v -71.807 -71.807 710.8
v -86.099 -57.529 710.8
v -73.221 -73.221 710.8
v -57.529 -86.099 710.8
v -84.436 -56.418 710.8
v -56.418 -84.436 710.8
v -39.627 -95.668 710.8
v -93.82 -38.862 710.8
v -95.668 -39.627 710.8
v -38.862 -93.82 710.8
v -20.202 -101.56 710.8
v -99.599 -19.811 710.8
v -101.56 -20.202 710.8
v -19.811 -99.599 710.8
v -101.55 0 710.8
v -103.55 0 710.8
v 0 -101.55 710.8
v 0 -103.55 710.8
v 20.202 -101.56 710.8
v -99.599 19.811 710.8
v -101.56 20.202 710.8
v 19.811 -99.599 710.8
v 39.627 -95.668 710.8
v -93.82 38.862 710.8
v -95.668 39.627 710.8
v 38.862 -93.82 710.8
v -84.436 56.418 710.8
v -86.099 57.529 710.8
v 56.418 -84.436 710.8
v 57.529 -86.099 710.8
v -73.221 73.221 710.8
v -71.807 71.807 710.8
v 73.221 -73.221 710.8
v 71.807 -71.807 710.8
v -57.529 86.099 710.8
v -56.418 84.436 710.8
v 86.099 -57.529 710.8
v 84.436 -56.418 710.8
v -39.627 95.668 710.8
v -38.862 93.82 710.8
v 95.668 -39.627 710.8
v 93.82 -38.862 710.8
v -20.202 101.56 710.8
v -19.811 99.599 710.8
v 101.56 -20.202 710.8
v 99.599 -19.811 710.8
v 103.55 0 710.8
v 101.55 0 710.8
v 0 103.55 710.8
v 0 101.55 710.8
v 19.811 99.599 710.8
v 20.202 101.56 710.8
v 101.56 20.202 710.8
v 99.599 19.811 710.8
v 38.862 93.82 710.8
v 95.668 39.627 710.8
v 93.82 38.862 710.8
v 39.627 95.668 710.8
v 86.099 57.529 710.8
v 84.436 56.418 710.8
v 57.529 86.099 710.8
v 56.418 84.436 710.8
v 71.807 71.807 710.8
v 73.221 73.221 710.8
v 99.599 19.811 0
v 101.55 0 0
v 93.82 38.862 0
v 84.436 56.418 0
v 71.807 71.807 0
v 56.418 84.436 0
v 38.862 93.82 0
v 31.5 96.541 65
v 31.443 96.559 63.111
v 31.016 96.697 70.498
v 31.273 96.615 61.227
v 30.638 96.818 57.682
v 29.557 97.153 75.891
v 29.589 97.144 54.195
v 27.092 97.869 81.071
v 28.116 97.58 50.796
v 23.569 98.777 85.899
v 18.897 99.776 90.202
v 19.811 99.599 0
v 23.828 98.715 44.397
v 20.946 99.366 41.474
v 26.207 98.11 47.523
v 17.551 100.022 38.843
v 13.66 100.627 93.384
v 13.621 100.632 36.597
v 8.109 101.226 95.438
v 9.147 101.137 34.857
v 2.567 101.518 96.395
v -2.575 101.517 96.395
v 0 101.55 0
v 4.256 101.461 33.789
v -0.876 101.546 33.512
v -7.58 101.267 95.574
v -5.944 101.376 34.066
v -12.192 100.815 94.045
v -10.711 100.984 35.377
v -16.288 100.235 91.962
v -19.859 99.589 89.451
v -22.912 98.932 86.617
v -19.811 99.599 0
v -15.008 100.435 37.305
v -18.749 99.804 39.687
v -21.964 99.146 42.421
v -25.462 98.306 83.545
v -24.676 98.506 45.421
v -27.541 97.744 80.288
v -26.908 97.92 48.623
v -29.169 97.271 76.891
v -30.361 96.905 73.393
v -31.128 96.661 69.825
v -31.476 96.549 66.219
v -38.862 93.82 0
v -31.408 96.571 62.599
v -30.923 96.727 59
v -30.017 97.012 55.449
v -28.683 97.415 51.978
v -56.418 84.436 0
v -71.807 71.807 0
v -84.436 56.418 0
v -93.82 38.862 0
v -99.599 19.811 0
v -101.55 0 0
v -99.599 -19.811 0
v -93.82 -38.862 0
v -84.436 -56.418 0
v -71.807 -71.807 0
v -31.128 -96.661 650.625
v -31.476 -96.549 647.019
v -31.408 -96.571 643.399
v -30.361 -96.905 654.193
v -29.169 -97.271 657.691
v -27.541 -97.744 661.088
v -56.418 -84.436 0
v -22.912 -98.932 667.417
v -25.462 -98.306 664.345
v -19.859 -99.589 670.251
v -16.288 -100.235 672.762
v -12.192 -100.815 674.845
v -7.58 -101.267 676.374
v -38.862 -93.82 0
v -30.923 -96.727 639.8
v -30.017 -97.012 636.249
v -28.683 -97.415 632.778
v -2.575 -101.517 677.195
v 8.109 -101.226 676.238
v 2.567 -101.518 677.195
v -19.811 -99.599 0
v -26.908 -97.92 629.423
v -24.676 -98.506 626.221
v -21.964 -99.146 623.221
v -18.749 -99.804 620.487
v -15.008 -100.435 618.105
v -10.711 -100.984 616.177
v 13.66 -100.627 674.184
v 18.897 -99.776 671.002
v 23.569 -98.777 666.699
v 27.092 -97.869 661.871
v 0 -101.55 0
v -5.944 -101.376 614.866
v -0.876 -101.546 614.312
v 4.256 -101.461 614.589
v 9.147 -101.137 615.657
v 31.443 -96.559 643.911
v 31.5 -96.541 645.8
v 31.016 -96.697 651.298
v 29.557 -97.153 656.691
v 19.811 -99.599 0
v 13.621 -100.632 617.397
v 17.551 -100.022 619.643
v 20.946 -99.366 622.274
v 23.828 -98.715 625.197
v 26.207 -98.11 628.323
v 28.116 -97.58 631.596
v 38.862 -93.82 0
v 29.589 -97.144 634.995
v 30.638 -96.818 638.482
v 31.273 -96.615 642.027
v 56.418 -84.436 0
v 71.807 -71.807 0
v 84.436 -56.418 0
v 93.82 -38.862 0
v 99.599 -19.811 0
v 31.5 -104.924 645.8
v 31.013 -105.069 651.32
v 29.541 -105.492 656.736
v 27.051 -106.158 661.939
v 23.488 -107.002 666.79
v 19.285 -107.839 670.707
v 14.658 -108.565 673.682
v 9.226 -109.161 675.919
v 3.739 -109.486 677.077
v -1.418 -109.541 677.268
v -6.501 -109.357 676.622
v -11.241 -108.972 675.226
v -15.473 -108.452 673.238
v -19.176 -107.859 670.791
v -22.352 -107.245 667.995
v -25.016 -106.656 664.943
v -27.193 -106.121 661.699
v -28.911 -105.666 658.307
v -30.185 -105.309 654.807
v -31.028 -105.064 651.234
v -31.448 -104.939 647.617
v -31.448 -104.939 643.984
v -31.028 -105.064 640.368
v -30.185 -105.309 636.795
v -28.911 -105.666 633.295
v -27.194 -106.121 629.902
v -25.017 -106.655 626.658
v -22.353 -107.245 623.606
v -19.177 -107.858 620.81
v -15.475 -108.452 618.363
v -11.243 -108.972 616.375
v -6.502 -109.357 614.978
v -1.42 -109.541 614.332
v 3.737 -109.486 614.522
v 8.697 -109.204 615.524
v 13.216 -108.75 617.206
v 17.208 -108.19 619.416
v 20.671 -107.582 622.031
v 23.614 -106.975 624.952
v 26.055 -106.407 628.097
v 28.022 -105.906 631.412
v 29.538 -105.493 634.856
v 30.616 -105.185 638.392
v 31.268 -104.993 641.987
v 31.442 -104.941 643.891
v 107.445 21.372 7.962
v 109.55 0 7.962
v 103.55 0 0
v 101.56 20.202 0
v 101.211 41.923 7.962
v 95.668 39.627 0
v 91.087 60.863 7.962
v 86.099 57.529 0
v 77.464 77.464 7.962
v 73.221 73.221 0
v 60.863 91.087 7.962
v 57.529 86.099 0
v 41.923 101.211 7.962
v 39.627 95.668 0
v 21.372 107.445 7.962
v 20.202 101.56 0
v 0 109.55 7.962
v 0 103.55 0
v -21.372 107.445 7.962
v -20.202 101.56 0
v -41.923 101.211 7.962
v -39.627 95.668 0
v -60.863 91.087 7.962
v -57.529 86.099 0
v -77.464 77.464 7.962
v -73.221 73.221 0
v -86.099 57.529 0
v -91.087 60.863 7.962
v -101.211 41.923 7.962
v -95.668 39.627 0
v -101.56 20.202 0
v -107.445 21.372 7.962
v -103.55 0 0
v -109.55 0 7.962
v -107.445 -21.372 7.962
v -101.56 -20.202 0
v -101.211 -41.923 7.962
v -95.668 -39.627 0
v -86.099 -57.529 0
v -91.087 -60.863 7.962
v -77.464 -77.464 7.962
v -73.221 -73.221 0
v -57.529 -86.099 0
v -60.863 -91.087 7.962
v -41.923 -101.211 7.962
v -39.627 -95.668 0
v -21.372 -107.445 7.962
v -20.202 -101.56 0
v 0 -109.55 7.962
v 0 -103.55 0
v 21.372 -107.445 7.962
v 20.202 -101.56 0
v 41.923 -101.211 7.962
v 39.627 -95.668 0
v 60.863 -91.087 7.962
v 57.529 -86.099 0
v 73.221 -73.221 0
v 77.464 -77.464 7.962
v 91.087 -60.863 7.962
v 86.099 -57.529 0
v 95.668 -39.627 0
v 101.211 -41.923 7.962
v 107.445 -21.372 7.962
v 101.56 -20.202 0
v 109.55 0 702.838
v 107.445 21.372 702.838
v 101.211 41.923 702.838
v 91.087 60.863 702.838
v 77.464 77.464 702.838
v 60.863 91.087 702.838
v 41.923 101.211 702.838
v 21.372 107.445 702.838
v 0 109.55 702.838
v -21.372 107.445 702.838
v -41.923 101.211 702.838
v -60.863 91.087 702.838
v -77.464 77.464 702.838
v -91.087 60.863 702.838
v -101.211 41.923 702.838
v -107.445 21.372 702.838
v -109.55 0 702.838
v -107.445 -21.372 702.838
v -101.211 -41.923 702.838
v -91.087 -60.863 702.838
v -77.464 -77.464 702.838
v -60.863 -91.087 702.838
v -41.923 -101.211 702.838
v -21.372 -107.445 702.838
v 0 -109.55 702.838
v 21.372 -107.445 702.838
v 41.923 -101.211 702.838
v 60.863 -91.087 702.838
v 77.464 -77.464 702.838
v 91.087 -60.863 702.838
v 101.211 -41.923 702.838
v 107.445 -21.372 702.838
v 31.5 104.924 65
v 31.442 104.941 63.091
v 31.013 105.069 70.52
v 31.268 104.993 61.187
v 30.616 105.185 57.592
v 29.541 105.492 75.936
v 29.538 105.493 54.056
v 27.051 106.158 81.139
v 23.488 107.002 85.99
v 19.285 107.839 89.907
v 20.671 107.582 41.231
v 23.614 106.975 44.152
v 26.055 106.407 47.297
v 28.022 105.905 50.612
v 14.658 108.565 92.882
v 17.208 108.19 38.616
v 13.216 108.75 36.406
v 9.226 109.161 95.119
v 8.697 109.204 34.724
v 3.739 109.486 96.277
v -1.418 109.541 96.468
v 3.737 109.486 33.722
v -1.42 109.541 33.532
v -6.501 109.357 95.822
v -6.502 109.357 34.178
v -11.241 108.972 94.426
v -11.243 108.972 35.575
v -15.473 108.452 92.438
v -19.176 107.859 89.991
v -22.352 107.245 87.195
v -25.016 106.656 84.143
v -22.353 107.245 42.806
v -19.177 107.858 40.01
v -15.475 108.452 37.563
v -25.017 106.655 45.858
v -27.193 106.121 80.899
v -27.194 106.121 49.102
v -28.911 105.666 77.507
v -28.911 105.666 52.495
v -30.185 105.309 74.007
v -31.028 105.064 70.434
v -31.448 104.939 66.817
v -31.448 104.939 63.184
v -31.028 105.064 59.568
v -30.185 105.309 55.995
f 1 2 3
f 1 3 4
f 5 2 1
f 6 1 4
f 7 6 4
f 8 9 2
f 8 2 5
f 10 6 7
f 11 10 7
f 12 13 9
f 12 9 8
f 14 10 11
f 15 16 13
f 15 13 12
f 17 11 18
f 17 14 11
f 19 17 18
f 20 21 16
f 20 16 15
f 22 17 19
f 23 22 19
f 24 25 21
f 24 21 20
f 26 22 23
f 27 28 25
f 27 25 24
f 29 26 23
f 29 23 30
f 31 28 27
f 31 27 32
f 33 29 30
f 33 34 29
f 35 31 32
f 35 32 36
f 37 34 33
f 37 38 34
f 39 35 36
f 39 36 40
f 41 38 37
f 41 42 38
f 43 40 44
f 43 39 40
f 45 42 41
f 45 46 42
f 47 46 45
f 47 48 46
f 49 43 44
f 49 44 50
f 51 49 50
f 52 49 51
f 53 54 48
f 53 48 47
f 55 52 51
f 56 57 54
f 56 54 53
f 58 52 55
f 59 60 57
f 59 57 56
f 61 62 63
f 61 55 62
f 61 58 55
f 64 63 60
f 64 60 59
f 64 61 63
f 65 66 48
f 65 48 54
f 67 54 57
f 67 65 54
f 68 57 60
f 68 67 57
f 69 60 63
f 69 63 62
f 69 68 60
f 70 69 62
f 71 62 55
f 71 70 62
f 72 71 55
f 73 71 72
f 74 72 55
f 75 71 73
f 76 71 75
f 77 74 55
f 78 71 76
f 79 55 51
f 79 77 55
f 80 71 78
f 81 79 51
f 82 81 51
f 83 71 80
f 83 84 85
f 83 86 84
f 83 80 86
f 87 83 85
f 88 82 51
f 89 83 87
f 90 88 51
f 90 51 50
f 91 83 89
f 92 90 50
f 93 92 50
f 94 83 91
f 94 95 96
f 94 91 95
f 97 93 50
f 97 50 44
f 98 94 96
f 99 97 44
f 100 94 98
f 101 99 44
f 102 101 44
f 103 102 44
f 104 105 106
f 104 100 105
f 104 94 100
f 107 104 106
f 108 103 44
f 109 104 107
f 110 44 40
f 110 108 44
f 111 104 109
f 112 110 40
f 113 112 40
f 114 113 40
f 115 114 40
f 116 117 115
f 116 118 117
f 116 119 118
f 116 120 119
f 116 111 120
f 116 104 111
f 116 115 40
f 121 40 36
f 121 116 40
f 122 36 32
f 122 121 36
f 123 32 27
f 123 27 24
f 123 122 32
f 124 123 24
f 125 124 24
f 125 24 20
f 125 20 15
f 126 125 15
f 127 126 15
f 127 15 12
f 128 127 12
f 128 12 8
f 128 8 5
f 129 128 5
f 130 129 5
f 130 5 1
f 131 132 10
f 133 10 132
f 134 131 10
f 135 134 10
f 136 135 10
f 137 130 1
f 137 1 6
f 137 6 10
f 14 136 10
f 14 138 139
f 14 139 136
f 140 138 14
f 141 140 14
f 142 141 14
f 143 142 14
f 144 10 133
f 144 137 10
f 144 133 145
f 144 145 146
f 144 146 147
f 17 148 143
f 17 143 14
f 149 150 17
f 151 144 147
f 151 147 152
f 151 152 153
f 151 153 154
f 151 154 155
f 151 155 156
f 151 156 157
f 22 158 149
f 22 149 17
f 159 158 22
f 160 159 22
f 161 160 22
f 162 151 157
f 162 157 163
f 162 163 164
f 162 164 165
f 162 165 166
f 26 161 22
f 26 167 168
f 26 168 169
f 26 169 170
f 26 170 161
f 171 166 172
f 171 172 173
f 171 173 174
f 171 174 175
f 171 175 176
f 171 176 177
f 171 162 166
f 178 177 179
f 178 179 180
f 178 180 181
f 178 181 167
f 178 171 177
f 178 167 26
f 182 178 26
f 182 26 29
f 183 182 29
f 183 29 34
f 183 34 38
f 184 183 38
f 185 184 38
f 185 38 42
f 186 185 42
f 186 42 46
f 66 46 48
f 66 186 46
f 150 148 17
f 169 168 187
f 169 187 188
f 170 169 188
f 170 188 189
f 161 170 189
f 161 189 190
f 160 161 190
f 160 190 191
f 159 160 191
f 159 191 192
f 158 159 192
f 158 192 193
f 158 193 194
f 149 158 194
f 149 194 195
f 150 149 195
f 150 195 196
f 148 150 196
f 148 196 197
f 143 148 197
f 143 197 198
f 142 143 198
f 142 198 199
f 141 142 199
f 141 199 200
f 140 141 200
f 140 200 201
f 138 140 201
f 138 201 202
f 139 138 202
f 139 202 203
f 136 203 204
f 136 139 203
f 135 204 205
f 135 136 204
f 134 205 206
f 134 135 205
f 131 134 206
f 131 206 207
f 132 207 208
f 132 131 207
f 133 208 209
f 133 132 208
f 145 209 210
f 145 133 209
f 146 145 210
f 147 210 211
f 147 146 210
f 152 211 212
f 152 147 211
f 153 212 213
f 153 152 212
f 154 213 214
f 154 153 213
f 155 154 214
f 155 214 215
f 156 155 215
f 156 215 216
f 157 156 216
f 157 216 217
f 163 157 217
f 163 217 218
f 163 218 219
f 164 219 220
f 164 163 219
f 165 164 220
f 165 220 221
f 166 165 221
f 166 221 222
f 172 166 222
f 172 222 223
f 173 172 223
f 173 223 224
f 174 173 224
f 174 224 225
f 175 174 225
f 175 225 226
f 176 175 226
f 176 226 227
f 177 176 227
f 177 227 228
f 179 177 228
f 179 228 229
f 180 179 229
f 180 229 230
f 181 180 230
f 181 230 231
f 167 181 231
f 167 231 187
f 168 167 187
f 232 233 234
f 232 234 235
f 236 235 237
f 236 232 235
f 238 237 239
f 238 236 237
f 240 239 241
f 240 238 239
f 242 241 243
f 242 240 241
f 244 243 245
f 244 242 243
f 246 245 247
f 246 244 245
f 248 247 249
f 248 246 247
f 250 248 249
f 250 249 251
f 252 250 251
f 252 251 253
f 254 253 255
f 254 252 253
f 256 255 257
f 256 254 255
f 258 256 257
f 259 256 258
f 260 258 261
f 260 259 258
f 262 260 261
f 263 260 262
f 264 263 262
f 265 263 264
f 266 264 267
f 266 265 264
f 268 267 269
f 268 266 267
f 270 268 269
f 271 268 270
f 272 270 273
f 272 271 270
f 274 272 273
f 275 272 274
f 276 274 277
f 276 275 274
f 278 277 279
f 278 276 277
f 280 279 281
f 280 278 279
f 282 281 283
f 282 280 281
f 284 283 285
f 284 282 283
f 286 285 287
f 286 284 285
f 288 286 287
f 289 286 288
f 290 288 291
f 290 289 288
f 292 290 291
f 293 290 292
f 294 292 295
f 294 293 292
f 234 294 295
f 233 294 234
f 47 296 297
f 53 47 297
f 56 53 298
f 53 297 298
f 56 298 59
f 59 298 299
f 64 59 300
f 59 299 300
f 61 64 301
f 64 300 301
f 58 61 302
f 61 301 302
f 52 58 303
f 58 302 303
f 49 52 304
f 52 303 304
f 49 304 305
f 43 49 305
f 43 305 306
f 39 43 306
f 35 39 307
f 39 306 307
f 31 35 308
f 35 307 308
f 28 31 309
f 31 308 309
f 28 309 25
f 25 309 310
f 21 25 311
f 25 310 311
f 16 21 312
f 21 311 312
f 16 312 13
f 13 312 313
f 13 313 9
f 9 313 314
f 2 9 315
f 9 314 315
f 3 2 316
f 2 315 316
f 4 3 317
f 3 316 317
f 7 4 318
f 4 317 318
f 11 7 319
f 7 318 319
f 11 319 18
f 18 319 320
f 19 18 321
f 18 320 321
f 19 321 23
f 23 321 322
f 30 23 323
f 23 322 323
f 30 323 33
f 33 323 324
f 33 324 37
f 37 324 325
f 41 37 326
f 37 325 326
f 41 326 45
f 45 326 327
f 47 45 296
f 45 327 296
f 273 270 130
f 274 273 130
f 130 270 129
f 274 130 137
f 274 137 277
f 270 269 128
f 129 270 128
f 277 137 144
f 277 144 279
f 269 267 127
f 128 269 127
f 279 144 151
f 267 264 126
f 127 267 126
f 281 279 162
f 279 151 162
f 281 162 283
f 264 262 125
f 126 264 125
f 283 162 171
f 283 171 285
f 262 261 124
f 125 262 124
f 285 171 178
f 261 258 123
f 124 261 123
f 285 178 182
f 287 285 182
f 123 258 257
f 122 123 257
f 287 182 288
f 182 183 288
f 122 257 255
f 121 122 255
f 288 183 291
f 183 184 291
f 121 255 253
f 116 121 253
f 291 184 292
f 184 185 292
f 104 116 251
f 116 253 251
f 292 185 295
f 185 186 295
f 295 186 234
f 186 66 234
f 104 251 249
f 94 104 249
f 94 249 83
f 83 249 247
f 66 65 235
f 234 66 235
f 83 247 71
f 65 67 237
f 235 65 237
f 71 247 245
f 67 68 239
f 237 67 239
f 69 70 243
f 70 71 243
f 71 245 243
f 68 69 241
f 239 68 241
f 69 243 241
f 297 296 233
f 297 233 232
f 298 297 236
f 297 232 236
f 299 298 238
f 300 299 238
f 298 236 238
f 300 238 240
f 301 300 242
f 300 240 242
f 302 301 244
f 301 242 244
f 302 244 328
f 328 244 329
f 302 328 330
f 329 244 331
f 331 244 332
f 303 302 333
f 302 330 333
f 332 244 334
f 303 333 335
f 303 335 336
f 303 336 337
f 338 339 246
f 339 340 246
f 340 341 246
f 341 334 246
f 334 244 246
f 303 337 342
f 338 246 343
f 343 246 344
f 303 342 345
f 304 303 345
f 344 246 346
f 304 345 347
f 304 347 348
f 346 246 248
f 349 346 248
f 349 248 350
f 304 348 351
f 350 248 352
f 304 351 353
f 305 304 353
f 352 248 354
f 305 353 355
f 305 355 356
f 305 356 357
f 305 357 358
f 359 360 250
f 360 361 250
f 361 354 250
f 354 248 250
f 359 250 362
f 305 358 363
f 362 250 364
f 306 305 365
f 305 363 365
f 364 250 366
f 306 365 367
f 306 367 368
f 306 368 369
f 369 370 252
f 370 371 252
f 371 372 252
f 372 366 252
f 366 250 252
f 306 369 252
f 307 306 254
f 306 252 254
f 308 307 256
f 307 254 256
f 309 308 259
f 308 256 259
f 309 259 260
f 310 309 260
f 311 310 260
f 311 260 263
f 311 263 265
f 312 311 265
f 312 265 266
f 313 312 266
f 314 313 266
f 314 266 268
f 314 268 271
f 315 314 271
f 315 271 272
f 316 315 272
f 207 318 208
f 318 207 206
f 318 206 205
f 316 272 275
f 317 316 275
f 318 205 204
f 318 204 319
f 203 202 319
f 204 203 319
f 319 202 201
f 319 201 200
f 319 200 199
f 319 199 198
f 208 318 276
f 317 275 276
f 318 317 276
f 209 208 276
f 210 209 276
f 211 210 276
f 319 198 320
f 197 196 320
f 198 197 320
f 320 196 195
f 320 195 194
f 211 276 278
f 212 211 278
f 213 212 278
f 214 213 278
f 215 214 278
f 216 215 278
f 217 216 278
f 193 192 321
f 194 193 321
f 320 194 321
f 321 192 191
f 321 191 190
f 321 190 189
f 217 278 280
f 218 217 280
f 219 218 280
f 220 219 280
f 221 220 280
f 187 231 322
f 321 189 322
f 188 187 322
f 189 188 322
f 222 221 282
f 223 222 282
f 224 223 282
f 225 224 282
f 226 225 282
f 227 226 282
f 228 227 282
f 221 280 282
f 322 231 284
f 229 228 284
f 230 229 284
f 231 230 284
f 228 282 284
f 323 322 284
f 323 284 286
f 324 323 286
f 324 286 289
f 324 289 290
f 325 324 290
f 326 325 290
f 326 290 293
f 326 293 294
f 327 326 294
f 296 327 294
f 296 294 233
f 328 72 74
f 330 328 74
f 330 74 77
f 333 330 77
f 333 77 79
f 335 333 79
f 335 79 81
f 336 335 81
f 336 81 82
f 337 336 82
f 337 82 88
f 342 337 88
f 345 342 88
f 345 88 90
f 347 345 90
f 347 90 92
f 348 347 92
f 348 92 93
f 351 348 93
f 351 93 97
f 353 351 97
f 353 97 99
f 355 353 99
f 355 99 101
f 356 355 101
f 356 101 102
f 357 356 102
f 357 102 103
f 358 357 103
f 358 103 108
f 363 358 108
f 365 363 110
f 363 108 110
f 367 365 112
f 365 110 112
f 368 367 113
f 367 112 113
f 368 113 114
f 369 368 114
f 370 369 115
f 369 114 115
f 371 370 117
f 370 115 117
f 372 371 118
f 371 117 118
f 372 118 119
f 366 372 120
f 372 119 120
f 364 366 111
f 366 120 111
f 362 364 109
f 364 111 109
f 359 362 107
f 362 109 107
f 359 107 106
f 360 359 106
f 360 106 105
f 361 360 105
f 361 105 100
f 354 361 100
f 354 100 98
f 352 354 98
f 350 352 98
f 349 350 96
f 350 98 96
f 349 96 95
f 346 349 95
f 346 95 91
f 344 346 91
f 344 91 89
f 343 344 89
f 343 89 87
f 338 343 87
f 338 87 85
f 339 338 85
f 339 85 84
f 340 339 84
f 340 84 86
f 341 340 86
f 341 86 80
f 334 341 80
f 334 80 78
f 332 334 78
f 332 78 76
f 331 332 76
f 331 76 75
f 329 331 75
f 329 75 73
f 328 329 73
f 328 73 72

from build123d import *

# Parameters (mm, degrees)
F0_R       = 109.55
F0_R_2     = 101.55
F1_DEPTH   = 710.8
F2_SIZE2   = 7.9622689297
F2_SIZE    = 6
F2_2_SIZE2 = 7.9622689297
F2_2_SIZE  = 6
F3_R       = 31.5
F4_DEPTH   = 109.551
F5_DEPTH   = 109.5510001


with BuildPart() as f1:
    # F0 (on Top) → F1 (new body)
    with BuildSketch(Plane.XY):
        Circle(F0_R)
        Circle(F0_R_2, mode=Mode.SUBTRACT)
    extrude(amount=F1_DEPTH)

    # F2
    f2_edges = [f1.edges().sort_by_distance(p)[0] for p in [
        (-109.55, 0, 710.8),
    ]]
    f2_side = f1.faces().sort_by_distance((-106.451458, 0, 710.8))[0]
    chamfer(f2_edges, length=F2_SIZE, length2=F2_SIZE2, reference=f2_side)

    # F2#2
    f2_2_edges = [f1.edges().sort_by_distance(p)[0] for p in [
        (-109.55, 0, 0),
    ]]
    f2_2_side = f1.faces().sort_by_distance((-106.451458, 0, 0))[0]
    chamfer(f2_2_edges, length=F2_2_SIZE, length2=F2_2_SIZE2, reference=f2_2_side)

    # F3 (on Front) → F4 (cut, through all)
    with BuildSketch(Plane.XZ):
        with Locations((0, 645.8)):
            Circle(F3_R)
    extrude(amount=F4_DEPTH, mode=Mode.SUBTRACT)

    # F3 (on Front) → F5 (cut, through all)
    with BuildSketch(Plane.XZ):
        with Locations((0, 65)):
            Circle(F3_R)
    extrude(amount=-F5_DEPTH, mode=Mode.SUBTRACT)


solid = f1.part
